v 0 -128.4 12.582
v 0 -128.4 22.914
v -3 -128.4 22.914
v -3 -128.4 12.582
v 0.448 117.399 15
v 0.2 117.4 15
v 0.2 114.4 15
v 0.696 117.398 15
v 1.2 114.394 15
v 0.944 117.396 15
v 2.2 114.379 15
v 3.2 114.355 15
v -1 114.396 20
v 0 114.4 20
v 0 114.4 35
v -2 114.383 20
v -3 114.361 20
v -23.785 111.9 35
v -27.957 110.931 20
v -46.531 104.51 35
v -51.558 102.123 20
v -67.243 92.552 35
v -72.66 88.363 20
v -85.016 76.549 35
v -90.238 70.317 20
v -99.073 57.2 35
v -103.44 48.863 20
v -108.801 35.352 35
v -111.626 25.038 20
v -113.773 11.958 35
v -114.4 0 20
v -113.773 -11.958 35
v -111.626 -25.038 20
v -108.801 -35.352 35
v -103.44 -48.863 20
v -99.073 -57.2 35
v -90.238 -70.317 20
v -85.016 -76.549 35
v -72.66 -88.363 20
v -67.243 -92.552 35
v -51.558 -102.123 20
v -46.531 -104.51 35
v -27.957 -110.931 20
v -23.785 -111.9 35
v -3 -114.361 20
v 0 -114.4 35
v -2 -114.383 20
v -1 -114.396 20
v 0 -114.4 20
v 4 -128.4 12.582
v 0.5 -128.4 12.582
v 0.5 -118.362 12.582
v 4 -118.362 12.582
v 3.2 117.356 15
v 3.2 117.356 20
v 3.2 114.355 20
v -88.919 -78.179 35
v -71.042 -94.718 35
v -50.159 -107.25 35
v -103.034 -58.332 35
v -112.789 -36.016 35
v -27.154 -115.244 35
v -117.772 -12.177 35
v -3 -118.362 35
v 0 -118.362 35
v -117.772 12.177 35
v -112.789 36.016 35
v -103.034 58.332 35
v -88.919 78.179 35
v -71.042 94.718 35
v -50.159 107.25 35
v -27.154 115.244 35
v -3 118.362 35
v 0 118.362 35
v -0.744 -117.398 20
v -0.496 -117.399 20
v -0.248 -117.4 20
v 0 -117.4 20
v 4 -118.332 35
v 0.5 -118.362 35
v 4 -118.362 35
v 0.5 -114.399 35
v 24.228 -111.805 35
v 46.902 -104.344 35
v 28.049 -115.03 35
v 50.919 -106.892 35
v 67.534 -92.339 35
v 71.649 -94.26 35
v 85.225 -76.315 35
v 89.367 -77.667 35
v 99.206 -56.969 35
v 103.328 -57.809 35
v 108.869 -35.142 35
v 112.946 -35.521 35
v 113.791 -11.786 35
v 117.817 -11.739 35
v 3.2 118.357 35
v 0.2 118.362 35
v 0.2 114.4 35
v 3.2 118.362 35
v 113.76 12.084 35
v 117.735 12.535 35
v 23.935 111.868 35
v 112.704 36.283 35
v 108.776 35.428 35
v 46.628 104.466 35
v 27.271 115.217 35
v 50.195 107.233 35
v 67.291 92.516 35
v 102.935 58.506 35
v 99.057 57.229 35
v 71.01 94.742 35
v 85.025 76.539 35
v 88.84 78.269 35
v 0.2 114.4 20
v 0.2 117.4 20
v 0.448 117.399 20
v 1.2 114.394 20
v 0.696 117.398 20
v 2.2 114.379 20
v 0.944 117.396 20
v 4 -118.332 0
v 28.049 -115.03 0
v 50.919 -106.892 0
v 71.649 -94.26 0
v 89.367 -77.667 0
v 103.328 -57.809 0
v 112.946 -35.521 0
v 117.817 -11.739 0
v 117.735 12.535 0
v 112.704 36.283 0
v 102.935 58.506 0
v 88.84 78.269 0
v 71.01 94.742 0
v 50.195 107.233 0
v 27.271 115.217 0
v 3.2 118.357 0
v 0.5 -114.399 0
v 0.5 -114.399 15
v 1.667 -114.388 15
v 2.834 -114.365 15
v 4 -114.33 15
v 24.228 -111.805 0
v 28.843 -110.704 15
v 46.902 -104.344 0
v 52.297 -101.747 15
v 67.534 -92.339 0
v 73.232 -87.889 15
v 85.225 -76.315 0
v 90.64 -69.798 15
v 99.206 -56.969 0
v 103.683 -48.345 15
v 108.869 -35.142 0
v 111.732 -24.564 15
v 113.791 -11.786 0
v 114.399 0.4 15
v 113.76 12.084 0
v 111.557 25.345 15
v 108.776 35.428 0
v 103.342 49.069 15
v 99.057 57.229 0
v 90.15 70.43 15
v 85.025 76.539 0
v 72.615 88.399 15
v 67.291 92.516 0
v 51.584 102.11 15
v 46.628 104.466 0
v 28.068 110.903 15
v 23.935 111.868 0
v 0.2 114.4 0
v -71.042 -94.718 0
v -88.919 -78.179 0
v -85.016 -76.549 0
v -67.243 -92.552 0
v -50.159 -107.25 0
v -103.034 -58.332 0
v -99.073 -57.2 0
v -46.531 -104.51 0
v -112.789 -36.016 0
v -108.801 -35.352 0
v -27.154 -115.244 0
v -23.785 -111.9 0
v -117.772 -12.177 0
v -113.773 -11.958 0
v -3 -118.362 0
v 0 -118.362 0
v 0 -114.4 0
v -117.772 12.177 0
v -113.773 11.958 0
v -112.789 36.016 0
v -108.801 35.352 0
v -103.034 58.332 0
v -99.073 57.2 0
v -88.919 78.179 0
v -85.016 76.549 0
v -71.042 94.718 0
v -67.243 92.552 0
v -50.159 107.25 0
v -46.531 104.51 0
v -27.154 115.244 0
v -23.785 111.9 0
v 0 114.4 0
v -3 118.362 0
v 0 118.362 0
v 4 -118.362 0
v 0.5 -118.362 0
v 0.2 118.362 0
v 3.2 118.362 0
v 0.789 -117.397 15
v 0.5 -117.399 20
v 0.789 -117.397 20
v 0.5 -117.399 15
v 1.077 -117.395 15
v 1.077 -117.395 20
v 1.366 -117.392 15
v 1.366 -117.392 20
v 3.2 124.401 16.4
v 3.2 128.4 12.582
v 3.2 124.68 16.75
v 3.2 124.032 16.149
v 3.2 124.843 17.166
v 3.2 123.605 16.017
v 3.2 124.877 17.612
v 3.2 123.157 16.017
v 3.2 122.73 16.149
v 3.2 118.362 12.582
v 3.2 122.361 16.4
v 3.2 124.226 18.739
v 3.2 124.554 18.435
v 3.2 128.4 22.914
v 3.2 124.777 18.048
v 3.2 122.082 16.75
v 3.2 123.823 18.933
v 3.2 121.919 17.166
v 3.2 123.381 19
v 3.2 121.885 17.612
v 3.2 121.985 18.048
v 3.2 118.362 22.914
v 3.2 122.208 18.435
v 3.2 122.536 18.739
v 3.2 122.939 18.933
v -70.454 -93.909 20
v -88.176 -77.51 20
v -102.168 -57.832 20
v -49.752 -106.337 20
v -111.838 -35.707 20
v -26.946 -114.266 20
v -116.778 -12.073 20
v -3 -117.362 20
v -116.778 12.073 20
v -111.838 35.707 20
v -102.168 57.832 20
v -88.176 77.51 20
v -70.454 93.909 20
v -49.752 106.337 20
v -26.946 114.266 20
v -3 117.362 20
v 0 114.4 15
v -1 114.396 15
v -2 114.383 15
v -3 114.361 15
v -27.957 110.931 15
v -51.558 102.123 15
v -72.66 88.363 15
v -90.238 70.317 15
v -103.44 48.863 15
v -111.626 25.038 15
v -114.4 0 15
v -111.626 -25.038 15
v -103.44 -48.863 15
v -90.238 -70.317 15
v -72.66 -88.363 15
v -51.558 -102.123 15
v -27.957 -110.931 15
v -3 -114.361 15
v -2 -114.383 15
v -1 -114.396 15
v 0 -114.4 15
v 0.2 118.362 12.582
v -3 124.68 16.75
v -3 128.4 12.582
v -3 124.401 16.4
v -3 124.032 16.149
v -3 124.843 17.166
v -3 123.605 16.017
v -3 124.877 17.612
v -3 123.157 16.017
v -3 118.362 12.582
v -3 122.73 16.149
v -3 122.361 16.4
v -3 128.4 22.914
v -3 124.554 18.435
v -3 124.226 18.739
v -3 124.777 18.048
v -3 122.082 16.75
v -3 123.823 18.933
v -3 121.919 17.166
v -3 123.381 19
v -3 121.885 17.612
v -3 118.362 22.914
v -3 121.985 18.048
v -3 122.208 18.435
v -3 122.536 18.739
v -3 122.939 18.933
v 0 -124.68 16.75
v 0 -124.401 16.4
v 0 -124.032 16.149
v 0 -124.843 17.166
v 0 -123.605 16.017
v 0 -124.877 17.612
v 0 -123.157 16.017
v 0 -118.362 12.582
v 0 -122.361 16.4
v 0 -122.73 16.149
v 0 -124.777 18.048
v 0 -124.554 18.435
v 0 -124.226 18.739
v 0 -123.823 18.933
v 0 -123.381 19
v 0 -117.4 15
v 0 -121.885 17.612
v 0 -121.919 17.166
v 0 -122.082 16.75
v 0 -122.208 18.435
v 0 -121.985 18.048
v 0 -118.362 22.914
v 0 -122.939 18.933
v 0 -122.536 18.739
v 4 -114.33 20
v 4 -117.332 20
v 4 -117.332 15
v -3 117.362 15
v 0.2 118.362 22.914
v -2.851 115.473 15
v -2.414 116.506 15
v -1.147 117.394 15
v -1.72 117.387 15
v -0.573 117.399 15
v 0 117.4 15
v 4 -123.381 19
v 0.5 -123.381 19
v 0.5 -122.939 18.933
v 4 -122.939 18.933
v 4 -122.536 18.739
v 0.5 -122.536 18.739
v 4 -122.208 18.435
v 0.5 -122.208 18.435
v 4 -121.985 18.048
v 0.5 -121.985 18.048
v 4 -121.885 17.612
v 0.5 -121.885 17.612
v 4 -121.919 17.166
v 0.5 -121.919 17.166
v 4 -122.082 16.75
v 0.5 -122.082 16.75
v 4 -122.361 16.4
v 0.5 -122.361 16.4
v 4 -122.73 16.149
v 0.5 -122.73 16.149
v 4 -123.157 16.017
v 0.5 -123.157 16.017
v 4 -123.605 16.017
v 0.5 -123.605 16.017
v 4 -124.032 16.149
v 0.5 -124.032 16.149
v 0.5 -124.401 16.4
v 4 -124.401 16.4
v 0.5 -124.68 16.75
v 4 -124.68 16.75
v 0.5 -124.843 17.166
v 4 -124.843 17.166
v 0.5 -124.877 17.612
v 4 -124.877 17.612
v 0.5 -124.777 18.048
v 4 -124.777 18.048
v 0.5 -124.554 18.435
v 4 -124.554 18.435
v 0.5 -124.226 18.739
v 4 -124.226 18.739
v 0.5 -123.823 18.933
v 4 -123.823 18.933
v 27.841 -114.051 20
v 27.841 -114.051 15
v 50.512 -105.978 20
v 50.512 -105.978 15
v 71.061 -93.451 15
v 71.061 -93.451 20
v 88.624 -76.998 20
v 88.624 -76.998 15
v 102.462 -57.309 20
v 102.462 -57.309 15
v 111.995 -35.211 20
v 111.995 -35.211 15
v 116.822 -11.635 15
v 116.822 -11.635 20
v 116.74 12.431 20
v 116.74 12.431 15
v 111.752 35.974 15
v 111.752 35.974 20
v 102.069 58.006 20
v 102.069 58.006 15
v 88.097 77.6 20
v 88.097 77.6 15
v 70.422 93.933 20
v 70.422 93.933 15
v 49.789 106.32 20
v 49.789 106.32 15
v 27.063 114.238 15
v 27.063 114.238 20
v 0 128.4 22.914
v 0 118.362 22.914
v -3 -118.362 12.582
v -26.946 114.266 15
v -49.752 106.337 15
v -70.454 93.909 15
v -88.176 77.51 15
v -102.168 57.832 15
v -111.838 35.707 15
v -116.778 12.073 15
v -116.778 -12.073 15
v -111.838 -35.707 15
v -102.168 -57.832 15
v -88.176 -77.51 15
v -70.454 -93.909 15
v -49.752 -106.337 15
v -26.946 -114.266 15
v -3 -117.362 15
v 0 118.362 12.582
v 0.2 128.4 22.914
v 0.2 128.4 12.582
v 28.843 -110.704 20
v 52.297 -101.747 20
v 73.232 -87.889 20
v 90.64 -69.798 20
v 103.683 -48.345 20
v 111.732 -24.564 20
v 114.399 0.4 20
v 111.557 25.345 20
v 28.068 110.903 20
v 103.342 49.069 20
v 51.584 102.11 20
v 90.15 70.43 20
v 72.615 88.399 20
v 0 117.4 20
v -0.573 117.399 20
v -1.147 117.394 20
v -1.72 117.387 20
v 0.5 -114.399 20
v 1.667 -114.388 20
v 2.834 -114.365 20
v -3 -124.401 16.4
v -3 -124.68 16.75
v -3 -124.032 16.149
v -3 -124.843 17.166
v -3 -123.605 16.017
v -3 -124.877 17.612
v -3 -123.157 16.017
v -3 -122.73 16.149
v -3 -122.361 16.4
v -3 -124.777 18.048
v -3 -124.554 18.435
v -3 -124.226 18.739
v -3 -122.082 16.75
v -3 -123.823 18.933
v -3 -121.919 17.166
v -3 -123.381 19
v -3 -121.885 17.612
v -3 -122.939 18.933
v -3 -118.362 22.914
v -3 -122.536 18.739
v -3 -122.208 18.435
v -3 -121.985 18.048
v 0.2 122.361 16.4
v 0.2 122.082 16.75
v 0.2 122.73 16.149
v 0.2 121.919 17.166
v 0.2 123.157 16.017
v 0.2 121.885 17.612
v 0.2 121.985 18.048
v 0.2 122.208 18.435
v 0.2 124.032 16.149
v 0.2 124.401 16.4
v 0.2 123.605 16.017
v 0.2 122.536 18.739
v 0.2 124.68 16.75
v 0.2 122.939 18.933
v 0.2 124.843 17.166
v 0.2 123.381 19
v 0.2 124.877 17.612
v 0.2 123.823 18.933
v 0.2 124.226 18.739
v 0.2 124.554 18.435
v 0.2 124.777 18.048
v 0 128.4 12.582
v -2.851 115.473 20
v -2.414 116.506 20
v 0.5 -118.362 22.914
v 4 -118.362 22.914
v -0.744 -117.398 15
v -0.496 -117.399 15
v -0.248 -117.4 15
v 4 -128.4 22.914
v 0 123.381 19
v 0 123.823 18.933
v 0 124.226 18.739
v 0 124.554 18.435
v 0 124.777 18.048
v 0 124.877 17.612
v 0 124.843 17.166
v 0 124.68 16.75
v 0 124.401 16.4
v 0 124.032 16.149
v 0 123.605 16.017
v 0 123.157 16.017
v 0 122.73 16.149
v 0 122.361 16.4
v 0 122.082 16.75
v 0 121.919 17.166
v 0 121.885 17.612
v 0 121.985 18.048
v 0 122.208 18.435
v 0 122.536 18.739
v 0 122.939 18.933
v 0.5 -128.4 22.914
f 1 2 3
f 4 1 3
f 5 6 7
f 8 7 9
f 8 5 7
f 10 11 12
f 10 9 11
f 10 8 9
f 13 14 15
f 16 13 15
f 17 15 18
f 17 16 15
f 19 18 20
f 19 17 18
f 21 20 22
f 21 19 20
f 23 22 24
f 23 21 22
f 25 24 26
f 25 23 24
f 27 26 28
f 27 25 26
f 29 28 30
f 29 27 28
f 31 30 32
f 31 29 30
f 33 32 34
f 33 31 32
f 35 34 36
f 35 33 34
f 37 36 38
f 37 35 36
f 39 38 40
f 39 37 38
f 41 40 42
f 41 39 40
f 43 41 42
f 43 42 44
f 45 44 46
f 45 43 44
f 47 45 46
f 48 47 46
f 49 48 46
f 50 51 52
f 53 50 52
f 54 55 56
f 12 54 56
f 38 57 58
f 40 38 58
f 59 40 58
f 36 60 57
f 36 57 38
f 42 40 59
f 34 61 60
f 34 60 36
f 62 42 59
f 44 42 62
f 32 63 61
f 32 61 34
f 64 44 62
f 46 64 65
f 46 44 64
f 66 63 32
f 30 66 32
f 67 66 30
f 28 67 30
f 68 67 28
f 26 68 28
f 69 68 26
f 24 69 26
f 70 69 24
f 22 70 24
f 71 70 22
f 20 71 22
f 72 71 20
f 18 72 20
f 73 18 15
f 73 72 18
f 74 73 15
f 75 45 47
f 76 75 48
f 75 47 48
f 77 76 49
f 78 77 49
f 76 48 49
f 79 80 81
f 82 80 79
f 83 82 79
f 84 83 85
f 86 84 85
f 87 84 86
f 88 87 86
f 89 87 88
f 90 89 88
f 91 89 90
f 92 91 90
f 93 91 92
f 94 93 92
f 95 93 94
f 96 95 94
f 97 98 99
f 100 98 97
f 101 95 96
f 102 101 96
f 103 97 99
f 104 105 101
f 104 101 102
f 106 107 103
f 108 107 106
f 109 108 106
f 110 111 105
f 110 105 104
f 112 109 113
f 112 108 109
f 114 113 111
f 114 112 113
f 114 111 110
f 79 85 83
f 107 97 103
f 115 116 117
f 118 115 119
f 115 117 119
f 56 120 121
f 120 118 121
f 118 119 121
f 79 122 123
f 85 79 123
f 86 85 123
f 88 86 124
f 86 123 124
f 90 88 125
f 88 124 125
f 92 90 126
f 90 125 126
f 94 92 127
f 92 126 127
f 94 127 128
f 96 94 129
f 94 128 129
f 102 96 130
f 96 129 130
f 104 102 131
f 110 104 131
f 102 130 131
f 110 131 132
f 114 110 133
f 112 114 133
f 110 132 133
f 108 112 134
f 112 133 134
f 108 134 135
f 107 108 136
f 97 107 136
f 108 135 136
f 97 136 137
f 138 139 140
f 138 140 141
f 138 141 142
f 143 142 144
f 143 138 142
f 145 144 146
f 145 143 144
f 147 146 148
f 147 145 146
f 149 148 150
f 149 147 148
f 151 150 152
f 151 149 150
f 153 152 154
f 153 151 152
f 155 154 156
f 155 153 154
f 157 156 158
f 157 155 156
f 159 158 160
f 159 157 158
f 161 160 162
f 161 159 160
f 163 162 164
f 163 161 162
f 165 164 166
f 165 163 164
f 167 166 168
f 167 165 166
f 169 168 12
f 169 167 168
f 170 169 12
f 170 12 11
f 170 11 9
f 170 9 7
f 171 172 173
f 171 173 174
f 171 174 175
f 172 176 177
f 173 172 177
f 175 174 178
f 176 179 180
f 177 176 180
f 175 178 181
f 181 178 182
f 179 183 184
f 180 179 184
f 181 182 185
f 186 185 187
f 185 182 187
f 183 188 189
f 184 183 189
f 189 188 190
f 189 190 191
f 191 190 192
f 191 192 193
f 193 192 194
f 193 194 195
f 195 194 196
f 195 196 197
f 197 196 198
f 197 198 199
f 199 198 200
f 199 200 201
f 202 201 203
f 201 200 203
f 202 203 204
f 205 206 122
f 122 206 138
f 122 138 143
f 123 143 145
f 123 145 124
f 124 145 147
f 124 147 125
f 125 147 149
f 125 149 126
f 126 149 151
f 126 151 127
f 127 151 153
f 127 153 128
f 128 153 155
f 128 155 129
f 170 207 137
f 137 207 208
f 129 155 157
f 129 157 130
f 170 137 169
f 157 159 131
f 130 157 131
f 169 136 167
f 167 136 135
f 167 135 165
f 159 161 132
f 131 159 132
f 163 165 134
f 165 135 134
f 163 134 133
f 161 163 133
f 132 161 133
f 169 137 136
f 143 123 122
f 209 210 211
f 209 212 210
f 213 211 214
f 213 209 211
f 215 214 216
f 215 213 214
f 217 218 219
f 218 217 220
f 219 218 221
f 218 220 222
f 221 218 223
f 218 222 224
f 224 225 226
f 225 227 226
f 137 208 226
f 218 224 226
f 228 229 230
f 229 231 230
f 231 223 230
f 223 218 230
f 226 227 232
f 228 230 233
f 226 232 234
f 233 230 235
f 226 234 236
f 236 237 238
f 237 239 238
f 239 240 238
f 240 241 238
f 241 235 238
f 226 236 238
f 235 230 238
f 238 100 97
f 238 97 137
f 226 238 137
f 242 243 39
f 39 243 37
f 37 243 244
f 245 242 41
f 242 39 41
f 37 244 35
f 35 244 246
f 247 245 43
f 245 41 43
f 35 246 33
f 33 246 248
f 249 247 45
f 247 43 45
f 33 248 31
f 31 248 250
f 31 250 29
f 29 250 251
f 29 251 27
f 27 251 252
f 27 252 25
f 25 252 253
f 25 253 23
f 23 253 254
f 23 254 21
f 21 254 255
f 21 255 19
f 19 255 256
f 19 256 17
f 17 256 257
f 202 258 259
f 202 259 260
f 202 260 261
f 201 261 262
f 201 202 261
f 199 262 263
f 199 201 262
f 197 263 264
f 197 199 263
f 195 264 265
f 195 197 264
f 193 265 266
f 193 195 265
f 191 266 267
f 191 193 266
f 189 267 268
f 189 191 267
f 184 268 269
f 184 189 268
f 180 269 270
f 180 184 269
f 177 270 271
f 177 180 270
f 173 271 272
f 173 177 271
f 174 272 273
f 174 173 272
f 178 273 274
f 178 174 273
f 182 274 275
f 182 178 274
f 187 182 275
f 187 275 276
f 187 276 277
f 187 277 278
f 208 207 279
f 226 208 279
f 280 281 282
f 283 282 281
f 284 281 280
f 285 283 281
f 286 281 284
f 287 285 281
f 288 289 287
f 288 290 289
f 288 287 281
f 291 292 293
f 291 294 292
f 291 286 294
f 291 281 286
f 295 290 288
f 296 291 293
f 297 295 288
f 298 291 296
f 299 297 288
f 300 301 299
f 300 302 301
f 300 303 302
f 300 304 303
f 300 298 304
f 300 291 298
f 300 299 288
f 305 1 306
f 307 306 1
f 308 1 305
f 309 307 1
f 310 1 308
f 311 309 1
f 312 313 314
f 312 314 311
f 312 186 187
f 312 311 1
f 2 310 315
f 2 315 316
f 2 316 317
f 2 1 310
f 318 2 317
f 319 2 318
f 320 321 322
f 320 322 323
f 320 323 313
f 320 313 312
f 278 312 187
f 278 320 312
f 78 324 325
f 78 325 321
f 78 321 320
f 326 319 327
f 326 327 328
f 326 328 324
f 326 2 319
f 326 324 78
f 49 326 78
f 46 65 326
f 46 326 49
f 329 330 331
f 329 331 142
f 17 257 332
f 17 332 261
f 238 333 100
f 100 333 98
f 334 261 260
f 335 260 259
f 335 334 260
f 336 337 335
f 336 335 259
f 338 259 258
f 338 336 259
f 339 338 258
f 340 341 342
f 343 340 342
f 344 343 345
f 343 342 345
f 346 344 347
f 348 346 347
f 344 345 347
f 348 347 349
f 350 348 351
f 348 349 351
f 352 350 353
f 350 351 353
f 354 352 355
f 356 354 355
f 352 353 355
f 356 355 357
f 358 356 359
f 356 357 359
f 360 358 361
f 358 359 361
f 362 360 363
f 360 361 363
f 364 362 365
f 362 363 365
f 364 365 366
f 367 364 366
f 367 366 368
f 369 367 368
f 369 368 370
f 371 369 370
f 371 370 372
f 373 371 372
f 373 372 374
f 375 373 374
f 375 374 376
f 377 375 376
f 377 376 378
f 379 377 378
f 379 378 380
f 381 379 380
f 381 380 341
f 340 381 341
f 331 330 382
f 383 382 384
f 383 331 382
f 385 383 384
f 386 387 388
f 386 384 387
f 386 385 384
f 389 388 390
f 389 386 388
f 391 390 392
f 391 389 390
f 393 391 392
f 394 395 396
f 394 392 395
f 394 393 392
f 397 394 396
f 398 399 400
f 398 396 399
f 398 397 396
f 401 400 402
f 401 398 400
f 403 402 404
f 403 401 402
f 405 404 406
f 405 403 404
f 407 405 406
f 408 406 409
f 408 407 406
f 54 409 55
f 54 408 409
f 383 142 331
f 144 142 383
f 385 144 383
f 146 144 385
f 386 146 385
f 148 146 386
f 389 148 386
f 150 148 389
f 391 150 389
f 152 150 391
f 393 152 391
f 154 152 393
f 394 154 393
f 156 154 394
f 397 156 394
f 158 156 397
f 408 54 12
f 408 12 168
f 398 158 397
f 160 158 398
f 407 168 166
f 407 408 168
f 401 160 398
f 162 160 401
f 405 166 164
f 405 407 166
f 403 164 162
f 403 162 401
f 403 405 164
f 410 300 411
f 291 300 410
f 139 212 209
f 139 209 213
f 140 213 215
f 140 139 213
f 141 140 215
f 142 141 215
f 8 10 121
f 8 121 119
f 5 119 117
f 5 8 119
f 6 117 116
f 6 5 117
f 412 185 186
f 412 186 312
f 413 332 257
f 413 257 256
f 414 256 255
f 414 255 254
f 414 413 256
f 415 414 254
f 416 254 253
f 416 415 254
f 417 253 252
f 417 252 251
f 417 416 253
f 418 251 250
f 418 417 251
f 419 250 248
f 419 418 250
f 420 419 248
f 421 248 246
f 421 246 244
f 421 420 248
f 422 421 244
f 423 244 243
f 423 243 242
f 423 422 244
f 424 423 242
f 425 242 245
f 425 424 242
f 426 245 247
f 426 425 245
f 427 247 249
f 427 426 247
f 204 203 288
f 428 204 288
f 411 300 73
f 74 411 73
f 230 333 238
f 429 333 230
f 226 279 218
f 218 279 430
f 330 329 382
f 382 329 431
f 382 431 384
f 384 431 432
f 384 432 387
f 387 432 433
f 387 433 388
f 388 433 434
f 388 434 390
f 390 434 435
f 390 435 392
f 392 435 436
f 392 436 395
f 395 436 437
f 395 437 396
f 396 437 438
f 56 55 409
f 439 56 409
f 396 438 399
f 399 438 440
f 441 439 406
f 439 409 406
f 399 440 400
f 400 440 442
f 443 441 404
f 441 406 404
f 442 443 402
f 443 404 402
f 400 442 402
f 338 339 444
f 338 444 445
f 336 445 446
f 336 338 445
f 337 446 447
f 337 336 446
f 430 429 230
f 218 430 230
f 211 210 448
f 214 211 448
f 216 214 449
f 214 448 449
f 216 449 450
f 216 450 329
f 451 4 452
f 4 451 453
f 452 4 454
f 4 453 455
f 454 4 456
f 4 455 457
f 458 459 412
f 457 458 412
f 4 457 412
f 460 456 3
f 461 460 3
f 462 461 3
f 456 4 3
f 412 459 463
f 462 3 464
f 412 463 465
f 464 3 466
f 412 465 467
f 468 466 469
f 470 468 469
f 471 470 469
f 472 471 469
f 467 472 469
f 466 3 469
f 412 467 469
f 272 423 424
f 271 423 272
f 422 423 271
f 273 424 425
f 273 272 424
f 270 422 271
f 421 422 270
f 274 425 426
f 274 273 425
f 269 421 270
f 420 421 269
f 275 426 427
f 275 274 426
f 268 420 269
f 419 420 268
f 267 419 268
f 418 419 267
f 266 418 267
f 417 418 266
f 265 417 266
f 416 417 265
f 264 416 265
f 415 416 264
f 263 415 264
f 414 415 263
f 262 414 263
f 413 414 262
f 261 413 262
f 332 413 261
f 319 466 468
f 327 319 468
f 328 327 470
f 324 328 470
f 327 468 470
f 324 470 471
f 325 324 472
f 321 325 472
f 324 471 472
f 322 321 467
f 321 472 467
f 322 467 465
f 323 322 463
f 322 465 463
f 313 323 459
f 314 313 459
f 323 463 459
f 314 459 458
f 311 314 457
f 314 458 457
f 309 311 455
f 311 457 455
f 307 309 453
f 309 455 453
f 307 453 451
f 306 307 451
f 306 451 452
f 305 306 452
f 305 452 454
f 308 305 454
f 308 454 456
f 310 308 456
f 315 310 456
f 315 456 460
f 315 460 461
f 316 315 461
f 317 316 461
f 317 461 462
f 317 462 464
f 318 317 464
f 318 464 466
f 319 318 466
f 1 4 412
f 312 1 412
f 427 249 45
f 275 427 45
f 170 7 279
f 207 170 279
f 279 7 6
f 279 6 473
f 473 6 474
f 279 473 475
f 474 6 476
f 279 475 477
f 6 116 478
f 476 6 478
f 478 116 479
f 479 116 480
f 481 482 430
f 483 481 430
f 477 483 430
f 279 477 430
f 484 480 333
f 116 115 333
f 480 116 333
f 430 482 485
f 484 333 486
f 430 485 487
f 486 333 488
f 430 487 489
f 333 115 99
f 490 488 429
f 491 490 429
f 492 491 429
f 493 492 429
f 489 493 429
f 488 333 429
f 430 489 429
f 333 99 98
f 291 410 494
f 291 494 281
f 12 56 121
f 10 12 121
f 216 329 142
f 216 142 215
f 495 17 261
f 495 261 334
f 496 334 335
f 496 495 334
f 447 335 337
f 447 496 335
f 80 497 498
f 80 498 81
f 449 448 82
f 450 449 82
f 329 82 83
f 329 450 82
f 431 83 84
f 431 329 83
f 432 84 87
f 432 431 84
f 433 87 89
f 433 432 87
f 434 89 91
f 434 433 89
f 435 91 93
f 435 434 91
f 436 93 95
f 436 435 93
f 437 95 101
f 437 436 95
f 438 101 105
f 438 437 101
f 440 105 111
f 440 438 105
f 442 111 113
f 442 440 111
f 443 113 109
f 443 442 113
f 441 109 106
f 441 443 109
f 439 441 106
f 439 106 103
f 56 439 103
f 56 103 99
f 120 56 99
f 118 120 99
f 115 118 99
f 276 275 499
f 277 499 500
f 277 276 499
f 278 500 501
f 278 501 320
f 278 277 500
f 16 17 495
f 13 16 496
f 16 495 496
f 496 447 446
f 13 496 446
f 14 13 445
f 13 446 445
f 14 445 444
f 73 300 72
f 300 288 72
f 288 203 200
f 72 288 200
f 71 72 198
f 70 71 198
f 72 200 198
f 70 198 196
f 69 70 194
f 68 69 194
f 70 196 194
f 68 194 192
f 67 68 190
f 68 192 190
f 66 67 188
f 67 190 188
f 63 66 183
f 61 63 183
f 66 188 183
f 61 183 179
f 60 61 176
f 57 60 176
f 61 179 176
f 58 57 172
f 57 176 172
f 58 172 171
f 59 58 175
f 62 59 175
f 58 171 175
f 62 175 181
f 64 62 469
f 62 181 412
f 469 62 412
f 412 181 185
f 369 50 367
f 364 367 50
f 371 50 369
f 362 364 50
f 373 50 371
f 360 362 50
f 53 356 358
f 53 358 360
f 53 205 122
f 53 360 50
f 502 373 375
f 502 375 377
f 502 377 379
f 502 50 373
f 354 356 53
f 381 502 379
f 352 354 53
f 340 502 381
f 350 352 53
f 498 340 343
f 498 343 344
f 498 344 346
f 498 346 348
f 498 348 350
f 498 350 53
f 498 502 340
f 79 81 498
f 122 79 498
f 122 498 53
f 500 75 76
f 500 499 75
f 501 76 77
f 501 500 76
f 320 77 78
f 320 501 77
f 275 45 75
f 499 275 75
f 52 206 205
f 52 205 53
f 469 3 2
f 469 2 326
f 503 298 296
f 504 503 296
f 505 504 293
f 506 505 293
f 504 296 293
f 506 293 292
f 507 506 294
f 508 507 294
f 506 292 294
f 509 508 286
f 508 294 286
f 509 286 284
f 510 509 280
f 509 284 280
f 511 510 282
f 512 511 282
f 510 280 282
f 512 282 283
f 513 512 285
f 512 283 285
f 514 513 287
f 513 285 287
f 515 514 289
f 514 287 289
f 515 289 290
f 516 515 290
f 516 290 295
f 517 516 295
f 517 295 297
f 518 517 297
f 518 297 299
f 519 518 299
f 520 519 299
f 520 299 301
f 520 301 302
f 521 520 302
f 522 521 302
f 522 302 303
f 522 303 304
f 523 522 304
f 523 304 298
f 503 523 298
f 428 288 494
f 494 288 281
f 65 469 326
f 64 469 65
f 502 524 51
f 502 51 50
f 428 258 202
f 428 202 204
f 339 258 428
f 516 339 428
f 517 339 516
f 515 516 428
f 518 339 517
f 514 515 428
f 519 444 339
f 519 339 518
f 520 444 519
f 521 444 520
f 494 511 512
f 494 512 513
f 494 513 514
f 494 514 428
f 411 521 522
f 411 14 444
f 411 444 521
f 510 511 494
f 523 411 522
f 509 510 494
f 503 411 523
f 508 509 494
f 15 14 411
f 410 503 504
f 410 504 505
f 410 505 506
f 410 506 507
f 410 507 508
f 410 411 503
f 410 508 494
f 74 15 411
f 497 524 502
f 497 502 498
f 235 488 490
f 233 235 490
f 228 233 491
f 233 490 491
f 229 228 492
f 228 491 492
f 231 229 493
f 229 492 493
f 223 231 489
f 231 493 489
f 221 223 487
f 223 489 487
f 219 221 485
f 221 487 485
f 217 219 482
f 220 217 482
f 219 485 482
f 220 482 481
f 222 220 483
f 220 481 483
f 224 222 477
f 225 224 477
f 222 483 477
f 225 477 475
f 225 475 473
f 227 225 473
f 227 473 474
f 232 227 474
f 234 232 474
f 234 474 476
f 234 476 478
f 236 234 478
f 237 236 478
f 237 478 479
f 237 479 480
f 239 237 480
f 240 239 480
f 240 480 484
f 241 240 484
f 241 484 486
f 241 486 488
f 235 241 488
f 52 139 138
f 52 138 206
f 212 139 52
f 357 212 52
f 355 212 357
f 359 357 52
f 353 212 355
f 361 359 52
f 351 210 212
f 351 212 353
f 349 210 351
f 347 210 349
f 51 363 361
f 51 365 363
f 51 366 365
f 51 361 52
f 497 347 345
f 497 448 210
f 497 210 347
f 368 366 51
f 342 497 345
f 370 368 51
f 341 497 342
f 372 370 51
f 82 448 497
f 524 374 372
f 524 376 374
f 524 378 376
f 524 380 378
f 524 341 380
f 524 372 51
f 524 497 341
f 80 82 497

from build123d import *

# Parameters (mm, degrees)
SKETCH1_R      = 118.4
SKETCH1_R_2    = 114.4
EXTRUDE1_DEPTH = 15
SKETCH2_R      = 118.4
SKETCH2_R_2    = 117.4
EXTRUDE2_DEPTH = 5
SKETCH3_R      = 118.4
SKETCH3_R_2    = 114.4
EXTRUDE3_DEPTH = 15
EXTRUDE4_DEPTH = 35
SKETCH5_W      = 0.2
SKETCH5_H      = 17.636939157
SKETCH5_W_2    = 0.5
SKETCH5_H_2    = 21.284938381
EXTRUDE5_DEPTH = 36
SKETCH6_R      = 1.5
SKETCH6_W      = 12.085553783
SKETCH6_H      = 10.038012859
SKETCH6_W_2    = 12.582360216
EXTRUDE6_DEPTH = 122.4


with BuildPart() as part:
    # Sketch1 → Extrude1 (new body)
    with BuildSketch(Plane.XY):
        Circle(SKETCH1_R)
        Circle(SKETCH1_R_2, mode=Mode.SUBTRACT)
    extrude(amount=EXTRUDE1_DEPTH)

    # Sketch2 → Extrude2 (add)
    with BuildSketch(Plane.XY.offset(15)):
        Circle(SKETCH2_R)
        Circle(SKETCH2_R_2, mode=Mode.SUBTRACT)
    extrude(amount=EXTRUDE2_DEPTH)

    # Sketch3 → Extrude3 (add)
    with BuildSketch(Plane.XY.offset(20)):
        Circle(SKETCH3_R)
        Circle(SKETCH3_R_2, mode=Mode.SUBTRACT)
    extrude(amount=EXTRUDE3_DEPTH)

    # Sketch4 → Extrude4 (add)
    with BuildSketch(Plane.XY.offset(35)):
        with BuildLine():
            Line((0, 118.4), (0, 128.4))
            Line((0, 128.4), (-3, 128.4))
            Line((-3, 128.4), (-3, 114.360657571))
            ThreePointArc((-3, 114.360657571), (-2.167963765, 116.876422229), (0, 118.4))
        make_face()
        Polygon((0.2, 128.4), (3.2, 128.4), (3.2, 114.355235997), (0.2, 118.399831081), align=None)
        Polygon((0, -118.4), (0, -128.4), (-3, -128.4), (-3, -114.360657571), align=None)
        Polygon((0.5, -118.398944252), (0.5, -128.4), (4, -128.4), (4, -114.330048544), align=None)
    extrude(amount=-EXTRUDE4_DEPTH)

    # Sketch5 → Extrude5 (cut, through all)
    with BuildSketch(Plane.XY.offset(35)):
        with Locations((0.1, 119.581530422)):
            Rectangle(SKETCH5_W, SKETCH5_H)
        with Locations((0.25, -117.757530809)):
            Rectangle(SKETCH5_W_2, SKETCH5_H_2)
    extrude(amount=-EXTRUDE5_DEPTH, mode=Mode.SUBTRACT)

    # Sketch6 → Extrude6 (cut, through all)
    with BuildSketch(Plane.ZY.offset(3)):
        with Locations((17.5, 123.380993571)):
            Circle(SKETCH6_R)
        with Locations((17.5, -123.380993571)):
            Circle(SKETCH6_R)
        with Locations((28.957223109, 123.380993571)):
            Rectangle(SKETCH6_W, SKETCH6_H)
        with Locations((6.291180108, 123.380993571)):
            Rectangle(SKETCH6_W_2, SKETCH6_H)
        with Locations((28.957223109, -123.380993571)):
            Rectangle(SKETCH6_W, SKETCH6_H)
        with Locations((6.291180108, -123.380993571)):
            Rectangle(SKETCH6_W_2, SKETCH6_H)
    extrude(amount=-EXTRUDE6_DEPTH, mode=Mode.SUBTRACT)


solid = part.part
